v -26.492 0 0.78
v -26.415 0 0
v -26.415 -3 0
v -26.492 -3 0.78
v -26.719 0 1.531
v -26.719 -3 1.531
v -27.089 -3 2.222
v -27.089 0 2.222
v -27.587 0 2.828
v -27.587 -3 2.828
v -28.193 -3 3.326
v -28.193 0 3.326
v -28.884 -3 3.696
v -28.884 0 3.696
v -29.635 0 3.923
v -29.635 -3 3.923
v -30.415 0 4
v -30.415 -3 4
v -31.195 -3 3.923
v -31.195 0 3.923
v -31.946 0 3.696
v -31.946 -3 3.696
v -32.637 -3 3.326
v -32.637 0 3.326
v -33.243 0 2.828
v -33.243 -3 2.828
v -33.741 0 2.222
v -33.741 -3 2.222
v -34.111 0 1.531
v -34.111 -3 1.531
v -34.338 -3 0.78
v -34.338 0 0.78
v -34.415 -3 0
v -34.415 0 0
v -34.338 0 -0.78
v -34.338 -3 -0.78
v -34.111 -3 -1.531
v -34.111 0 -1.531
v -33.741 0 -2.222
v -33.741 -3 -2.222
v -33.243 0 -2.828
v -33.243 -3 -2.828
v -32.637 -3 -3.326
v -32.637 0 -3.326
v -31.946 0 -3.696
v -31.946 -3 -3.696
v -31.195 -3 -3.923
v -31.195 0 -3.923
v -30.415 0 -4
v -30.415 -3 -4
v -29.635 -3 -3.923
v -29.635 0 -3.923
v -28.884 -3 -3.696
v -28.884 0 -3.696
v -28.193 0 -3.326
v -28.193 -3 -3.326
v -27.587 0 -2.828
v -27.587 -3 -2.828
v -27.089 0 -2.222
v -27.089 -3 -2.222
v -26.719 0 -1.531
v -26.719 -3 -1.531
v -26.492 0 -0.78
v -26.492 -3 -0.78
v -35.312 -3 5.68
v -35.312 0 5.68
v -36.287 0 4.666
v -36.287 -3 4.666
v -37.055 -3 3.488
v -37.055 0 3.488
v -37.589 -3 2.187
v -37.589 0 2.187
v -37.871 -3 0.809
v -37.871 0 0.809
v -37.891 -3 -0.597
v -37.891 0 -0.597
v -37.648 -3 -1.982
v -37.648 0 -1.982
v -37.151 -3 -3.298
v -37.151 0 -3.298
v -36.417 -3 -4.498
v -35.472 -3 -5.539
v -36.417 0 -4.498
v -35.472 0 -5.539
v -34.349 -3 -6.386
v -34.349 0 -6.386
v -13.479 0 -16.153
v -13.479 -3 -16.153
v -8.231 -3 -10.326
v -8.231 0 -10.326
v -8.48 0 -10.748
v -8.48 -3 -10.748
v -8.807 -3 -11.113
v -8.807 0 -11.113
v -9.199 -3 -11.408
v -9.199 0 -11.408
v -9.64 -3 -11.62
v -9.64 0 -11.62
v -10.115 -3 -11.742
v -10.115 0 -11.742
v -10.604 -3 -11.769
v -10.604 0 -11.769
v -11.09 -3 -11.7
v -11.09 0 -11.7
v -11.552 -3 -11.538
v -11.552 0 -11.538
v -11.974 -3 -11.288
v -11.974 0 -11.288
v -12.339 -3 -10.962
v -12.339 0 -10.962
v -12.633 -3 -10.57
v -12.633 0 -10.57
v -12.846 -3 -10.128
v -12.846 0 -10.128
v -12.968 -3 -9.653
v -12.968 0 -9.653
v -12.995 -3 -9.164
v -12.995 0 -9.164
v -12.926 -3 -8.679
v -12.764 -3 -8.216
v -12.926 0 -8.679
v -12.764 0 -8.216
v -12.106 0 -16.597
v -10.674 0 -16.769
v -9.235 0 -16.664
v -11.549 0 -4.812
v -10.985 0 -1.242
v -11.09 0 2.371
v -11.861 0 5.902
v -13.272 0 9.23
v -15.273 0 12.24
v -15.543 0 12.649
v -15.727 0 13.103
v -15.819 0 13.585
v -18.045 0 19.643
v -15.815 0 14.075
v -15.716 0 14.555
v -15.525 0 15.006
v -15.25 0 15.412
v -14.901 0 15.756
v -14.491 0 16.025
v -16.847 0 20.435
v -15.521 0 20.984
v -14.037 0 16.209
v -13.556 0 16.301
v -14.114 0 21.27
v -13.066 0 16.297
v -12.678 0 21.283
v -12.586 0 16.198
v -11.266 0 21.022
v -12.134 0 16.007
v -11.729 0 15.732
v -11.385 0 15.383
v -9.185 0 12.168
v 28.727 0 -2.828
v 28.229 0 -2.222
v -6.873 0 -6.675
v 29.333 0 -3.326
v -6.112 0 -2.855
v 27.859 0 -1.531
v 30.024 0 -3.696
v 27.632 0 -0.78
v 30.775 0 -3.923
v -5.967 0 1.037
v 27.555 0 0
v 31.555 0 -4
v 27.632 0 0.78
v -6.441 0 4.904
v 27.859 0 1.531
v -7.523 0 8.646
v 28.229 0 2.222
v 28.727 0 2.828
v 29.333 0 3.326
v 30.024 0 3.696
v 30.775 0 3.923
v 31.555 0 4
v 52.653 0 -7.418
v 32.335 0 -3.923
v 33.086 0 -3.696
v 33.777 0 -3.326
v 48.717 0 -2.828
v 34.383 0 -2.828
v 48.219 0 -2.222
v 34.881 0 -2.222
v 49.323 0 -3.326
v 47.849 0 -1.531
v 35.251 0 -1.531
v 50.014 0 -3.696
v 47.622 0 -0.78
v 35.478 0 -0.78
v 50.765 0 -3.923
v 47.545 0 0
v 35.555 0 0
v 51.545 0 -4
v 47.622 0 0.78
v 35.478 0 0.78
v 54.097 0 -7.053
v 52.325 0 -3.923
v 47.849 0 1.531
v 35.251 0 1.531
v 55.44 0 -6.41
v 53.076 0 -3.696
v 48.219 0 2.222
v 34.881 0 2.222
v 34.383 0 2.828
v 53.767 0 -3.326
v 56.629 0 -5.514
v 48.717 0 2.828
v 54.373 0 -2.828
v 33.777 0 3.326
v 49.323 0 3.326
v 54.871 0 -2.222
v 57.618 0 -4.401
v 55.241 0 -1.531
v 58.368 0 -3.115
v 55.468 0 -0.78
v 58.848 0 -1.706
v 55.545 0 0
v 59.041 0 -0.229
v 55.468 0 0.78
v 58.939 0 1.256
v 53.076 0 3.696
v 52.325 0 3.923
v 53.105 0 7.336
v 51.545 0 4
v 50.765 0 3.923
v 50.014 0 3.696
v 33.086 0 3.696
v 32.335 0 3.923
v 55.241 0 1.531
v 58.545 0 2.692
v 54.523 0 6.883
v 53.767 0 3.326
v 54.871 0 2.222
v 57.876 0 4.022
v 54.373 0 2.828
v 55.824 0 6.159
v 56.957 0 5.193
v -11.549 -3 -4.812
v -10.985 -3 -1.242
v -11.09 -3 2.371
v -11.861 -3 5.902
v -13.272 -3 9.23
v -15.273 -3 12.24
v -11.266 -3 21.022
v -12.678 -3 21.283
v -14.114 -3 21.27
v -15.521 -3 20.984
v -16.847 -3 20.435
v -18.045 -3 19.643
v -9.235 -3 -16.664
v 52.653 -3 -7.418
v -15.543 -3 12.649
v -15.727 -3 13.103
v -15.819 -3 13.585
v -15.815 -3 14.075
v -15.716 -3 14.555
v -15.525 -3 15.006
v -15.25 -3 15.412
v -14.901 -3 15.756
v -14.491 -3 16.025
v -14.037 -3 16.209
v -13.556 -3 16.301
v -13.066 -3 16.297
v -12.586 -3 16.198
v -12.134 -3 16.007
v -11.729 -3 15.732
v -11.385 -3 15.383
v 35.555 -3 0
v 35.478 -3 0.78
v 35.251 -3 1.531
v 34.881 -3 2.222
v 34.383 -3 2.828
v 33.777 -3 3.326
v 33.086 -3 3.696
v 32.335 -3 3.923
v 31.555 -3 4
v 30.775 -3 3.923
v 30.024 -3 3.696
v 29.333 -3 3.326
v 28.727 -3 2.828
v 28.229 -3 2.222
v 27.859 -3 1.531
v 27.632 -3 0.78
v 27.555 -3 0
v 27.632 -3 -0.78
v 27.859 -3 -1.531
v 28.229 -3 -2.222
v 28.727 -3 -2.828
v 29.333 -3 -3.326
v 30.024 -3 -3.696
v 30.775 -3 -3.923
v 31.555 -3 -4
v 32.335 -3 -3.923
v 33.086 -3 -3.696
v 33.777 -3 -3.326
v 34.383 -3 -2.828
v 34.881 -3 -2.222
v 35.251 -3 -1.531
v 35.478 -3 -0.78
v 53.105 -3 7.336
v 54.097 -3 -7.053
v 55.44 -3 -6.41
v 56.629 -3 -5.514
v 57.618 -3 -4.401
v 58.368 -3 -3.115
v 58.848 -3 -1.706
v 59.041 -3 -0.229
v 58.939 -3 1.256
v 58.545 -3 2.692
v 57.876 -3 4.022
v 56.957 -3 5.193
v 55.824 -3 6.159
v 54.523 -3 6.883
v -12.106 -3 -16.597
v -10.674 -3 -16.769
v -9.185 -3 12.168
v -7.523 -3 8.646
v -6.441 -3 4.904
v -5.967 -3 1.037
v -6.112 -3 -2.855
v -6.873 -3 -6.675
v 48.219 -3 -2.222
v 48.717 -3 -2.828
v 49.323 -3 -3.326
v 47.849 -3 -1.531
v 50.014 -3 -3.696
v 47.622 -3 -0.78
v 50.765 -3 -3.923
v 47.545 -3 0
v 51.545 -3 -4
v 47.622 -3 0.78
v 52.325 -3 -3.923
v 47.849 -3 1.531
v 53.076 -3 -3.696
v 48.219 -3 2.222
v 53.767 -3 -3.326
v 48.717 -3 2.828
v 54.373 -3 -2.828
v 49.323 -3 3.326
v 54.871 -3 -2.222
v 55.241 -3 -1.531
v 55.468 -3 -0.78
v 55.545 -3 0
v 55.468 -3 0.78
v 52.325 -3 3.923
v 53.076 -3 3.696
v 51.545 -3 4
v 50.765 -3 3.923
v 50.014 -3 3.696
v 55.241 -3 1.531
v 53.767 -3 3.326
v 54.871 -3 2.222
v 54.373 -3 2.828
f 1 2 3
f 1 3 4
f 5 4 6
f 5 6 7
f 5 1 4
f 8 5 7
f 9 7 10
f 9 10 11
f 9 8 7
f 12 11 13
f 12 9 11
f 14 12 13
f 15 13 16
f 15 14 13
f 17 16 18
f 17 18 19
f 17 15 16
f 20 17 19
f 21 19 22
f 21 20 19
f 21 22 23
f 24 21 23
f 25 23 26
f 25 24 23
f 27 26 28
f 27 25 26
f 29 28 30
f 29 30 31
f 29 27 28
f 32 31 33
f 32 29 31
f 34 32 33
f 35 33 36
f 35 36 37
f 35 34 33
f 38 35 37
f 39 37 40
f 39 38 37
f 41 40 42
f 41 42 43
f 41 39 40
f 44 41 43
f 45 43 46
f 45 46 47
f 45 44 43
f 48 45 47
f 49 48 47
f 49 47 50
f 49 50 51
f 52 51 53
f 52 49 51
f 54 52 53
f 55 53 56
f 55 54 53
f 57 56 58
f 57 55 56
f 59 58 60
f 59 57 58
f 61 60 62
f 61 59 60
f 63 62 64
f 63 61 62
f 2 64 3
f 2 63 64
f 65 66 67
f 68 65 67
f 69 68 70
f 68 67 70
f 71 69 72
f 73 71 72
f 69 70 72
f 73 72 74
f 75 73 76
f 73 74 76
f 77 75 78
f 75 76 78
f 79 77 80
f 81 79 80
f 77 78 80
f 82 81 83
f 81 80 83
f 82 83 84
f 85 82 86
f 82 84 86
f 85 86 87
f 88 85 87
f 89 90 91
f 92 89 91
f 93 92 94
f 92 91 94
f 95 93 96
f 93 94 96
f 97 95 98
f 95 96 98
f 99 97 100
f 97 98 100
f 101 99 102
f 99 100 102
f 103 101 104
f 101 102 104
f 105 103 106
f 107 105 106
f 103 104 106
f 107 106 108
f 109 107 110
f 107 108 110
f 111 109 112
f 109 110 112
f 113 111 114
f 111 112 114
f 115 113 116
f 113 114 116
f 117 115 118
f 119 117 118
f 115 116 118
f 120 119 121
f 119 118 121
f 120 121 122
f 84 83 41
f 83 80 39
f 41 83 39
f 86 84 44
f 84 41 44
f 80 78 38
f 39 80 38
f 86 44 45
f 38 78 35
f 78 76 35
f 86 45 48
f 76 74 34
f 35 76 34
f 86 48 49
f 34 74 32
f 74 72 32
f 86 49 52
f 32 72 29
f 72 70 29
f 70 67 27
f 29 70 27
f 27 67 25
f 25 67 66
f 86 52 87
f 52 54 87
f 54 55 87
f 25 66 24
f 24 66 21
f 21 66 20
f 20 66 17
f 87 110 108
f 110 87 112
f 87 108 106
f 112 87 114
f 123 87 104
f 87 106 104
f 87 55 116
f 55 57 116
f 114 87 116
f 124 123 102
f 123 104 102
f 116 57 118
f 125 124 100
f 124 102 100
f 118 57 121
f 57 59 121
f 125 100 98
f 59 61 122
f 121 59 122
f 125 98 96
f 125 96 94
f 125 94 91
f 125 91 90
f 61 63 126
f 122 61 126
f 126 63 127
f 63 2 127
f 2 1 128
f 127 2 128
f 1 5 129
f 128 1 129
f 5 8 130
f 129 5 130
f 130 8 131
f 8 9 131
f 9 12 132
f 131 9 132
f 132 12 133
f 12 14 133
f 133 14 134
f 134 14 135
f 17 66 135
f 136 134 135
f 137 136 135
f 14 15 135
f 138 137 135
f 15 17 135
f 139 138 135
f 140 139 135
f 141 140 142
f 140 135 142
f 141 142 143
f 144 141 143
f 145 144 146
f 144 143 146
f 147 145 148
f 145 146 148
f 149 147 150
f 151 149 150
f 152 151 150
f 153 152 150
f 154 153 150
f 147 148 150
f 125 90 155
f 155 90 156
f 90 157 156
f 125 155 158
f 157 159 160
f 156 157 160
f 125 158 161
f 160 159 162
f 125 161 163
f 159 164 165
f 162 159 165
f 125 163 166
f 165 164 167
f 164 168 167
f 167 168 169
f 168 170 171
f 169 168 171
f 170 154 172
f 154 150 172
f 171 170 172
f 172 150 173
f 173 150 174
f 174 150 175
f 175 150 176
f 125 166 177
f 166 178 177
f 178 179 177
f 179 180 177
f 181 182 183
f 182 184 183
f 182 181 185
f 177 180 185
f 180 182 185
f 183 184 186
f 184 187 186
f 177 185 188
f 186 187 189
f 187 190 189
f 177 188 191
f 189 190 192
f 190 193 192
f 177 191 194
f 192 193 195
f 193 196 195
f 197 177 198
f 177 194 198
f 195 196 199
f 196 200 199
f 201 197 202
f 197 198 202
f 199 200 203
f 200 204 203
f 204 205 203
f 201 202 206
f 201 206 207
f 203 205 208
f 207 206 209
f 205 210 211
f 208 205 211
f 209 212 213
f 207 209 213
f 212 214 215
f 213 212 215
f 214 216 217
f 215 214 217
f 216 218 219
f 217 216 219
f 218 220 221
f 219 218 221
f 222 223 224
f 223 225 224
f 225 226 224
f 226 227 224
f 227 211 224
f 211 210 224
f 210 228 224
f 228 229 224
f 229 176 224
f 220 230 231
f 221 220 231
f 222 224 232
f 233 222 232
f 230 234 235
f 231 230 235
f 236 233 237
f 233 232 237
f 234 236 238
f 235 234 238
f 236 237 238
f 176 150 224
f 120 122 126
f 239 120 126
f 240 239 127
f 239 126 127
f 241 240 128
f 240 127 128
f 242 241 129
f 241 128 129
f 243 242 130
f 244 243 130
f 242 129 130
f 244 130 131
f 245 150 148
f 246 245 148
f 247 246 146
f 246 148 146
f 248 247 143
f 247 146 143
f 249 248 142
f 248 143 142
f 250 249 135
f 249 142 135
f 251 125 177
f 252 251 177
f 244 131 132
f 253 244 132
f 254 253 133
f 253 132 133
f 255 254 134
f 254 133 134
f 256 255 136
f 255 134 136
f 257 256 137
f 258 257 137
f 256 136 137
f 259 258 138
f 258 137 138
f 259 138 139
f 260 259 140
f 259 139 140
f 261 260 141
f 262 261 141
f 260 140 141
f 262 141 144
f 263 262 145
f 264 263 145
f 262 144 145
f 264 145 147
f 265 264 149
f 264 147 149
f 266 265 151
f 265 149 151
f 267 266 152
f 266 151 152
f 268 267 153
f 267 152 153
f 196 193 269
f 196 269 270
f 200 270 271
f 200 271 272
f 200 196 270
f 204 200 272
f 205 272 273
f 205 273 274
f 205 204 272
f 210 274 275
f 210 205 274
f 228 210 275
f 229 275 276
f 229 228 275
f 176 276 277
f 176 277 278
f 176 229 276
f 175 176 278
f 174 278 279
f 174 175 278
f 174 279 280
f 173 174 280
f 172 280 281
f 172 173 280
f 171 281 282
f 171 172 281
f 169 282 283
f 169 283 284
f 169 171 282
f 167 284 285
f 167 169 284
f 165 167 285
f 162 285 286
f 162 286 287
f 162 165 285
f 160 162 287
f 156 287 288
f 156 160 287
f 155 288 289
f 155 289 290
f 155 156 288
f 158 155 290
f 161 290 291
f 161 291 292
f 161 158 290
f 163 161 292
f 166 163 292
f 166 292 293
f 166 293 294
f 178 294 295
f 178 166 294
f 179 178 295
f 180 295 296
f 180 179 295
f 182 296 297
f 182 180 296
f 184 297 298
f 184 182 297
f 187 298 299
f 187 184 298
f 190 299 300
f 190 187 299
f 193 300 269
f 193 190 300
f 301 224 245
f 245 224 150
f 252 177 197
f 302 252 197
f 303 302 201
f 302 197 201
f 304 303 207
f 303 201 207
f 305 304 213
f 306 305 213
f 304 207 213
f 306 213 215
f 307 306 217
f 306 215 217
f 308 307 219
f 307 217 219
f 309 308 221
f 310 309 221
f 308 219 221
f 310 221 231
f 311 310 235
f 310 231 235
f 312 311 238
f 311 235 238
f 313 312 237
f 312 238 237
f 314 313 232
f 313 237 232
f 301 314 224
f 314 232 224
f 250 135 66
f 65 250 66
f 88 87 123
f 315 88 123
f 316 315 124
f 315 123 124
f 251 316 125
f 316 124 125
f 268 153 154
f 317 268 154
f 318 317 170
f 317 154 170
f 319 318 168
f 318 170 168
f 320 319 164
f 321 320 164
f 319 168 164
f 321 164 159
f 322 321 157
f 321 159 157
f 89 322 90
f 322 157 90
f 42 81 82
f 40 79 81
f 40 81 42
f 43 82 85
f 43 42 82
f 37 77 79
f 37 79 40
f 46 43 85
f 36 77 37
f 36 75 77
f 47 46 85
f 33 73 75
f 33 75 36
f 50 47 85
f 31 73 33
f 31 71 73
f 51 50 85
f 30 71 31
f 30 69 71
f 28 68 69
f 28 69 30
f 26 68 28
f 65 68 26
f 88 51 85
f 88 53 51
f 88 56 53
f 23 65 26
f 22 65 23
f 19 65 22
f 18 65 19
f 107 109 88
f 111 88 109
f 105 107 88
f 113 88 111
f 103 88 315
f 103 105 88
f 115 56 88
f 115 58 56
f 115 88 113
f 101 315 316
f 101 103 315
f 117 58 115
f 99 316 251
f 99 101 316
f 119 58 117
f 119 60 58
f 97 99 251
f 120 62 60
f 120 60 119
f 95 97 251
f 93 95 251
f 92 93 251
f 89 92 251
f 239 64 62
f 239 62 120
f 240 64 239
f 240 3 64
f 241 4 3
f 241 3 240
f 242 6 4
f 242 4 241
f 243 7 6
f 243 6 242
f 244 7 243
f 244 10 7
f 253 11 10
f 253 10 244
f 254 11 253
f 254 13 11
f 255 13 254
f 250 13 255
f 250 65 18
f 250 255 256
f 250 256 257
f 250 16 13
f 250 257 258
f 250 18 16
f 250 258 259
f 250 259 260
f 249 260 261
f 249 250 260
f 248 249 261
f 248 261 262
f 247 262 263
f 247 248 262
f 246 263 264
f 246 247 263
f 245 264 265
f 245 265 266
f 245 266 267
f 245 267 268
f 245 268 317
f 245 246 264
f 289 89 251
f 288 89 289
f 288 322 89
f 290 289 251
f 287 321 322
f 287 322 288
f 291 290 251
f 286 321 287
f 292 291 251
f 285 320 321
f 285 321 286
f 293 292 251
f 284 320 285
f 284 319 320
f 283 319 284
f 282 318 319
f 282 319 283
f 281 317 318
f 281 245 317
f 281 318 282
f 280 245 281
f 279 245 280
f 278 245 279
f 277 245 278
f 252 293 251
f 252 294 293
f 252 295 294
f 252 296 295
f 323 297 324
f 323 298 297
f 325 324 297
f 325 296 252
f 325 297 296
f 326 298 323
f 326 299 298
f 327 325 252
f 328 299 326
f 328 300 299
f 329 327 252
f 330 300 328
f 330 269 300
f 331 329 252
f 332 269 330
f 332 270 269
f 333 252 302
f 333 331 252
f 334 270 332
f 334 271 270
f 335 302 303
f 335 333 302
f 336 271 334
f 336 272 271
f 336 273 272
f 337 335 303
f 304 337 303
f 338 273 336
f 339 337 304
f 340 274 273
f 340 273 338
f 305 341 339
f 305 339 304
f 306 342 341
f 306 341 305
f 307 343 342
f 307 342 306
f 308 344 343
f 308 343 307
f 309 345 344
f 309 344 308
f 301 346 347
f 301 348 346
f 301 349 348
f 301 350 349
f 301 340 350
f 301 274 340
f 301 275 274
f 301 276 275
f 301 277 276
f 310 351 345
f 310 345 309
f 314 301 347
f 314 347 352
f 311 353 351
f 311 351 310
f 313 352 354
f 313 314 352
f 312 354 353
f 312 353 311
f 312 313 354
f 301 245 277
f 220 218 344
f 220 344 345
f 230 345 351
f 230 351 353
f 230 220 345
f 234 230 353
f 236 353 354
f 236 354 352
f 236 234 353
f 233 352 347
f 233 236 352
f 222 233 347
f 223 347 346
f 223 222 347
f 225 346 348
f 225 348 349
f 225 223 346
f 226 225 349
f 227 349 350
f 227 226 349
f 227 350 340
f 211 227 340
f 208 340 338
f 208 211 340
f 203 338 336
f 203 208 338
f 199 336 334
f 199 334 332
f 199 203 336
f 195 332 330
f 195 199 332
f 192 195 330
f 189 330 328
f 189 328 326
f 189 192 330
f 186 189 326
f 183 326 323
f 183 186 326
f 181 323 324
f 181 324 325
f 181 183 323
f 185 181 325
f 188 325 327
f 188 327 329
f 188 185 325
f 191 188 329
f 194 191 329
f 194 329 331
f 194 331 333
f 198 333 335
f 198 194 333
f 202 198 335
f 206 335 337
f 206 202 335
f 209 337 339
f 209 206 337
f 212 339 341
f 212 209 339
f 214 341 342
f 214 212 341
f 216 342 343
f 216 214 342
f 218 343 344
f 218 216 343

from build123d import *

# Parameters (mm, degrees)
F0_R     = 4
F1_DEPTH = 3


with BuildPart() as f1:
    # F0 (on Front) → F1 (new body)
    with BuildSketch(Plane.XZ):
        with BuildLine():
            Line((53.104726, 7.336025), (-11.265956, 21.021994))
            ThreePointArc((-11.265956, 21.021994), (-14.82391, 21.160881), (-18.044949, 19.643238))
            Line((-18.044949, 19.643238), (-35.312375, 5.680292))
            ThreePointArc((-35.312375, 5.680292), (-37.891192, -0.597124), (-34.34867, -6.385628))
            Line((-34.34867, -6.385628), (-13.478804, -16.153186))
            ThreePointArc((-13.478804, -16.153186), (-11.393882, -16.717558), (-9.234581, -16.664338))
            Line((-9.234581, -16.664338), (52.653274, -7.417663))
            ThreePointArc((52.653274, -7.417663), (59.041491, -0.229387), (53.104726, 7.336025))
        make_face()
        with Locations((-30.415, 0)):
            Circle(F0_R, mode=Mode.SUBTRACT)
        with BuildLine():
            ThreePointArc((-15.273344, 12.239736), (-14.900729, 15.75558), (-11.384885, 15.382966))
            ThreePointArc((-11.384885, 15.382966), (-6.127117, 2.979875), (-8.230613, -10.326369))
            ThreePointArc((-8.230613, -10.326369), (-11.552104, -11.537854), (-12.76359, -8.216363))
            ThreePointArc((-12.76359, -8.216363), (-11.089905, 2.370991), (-15.273344, 12.239736))
        make_face(mode=Mode.SUBTRACT)
        with Locations((31.555, 0)):
            Circle(F0_R, mode=Mode.SUBTRACT)
        with Locations((51.545, 0)):
            Circle(F0_R, mode=Mode.SUBTRACT)
    extrude(amount=F1_DEPTH)


solid = f1.part
